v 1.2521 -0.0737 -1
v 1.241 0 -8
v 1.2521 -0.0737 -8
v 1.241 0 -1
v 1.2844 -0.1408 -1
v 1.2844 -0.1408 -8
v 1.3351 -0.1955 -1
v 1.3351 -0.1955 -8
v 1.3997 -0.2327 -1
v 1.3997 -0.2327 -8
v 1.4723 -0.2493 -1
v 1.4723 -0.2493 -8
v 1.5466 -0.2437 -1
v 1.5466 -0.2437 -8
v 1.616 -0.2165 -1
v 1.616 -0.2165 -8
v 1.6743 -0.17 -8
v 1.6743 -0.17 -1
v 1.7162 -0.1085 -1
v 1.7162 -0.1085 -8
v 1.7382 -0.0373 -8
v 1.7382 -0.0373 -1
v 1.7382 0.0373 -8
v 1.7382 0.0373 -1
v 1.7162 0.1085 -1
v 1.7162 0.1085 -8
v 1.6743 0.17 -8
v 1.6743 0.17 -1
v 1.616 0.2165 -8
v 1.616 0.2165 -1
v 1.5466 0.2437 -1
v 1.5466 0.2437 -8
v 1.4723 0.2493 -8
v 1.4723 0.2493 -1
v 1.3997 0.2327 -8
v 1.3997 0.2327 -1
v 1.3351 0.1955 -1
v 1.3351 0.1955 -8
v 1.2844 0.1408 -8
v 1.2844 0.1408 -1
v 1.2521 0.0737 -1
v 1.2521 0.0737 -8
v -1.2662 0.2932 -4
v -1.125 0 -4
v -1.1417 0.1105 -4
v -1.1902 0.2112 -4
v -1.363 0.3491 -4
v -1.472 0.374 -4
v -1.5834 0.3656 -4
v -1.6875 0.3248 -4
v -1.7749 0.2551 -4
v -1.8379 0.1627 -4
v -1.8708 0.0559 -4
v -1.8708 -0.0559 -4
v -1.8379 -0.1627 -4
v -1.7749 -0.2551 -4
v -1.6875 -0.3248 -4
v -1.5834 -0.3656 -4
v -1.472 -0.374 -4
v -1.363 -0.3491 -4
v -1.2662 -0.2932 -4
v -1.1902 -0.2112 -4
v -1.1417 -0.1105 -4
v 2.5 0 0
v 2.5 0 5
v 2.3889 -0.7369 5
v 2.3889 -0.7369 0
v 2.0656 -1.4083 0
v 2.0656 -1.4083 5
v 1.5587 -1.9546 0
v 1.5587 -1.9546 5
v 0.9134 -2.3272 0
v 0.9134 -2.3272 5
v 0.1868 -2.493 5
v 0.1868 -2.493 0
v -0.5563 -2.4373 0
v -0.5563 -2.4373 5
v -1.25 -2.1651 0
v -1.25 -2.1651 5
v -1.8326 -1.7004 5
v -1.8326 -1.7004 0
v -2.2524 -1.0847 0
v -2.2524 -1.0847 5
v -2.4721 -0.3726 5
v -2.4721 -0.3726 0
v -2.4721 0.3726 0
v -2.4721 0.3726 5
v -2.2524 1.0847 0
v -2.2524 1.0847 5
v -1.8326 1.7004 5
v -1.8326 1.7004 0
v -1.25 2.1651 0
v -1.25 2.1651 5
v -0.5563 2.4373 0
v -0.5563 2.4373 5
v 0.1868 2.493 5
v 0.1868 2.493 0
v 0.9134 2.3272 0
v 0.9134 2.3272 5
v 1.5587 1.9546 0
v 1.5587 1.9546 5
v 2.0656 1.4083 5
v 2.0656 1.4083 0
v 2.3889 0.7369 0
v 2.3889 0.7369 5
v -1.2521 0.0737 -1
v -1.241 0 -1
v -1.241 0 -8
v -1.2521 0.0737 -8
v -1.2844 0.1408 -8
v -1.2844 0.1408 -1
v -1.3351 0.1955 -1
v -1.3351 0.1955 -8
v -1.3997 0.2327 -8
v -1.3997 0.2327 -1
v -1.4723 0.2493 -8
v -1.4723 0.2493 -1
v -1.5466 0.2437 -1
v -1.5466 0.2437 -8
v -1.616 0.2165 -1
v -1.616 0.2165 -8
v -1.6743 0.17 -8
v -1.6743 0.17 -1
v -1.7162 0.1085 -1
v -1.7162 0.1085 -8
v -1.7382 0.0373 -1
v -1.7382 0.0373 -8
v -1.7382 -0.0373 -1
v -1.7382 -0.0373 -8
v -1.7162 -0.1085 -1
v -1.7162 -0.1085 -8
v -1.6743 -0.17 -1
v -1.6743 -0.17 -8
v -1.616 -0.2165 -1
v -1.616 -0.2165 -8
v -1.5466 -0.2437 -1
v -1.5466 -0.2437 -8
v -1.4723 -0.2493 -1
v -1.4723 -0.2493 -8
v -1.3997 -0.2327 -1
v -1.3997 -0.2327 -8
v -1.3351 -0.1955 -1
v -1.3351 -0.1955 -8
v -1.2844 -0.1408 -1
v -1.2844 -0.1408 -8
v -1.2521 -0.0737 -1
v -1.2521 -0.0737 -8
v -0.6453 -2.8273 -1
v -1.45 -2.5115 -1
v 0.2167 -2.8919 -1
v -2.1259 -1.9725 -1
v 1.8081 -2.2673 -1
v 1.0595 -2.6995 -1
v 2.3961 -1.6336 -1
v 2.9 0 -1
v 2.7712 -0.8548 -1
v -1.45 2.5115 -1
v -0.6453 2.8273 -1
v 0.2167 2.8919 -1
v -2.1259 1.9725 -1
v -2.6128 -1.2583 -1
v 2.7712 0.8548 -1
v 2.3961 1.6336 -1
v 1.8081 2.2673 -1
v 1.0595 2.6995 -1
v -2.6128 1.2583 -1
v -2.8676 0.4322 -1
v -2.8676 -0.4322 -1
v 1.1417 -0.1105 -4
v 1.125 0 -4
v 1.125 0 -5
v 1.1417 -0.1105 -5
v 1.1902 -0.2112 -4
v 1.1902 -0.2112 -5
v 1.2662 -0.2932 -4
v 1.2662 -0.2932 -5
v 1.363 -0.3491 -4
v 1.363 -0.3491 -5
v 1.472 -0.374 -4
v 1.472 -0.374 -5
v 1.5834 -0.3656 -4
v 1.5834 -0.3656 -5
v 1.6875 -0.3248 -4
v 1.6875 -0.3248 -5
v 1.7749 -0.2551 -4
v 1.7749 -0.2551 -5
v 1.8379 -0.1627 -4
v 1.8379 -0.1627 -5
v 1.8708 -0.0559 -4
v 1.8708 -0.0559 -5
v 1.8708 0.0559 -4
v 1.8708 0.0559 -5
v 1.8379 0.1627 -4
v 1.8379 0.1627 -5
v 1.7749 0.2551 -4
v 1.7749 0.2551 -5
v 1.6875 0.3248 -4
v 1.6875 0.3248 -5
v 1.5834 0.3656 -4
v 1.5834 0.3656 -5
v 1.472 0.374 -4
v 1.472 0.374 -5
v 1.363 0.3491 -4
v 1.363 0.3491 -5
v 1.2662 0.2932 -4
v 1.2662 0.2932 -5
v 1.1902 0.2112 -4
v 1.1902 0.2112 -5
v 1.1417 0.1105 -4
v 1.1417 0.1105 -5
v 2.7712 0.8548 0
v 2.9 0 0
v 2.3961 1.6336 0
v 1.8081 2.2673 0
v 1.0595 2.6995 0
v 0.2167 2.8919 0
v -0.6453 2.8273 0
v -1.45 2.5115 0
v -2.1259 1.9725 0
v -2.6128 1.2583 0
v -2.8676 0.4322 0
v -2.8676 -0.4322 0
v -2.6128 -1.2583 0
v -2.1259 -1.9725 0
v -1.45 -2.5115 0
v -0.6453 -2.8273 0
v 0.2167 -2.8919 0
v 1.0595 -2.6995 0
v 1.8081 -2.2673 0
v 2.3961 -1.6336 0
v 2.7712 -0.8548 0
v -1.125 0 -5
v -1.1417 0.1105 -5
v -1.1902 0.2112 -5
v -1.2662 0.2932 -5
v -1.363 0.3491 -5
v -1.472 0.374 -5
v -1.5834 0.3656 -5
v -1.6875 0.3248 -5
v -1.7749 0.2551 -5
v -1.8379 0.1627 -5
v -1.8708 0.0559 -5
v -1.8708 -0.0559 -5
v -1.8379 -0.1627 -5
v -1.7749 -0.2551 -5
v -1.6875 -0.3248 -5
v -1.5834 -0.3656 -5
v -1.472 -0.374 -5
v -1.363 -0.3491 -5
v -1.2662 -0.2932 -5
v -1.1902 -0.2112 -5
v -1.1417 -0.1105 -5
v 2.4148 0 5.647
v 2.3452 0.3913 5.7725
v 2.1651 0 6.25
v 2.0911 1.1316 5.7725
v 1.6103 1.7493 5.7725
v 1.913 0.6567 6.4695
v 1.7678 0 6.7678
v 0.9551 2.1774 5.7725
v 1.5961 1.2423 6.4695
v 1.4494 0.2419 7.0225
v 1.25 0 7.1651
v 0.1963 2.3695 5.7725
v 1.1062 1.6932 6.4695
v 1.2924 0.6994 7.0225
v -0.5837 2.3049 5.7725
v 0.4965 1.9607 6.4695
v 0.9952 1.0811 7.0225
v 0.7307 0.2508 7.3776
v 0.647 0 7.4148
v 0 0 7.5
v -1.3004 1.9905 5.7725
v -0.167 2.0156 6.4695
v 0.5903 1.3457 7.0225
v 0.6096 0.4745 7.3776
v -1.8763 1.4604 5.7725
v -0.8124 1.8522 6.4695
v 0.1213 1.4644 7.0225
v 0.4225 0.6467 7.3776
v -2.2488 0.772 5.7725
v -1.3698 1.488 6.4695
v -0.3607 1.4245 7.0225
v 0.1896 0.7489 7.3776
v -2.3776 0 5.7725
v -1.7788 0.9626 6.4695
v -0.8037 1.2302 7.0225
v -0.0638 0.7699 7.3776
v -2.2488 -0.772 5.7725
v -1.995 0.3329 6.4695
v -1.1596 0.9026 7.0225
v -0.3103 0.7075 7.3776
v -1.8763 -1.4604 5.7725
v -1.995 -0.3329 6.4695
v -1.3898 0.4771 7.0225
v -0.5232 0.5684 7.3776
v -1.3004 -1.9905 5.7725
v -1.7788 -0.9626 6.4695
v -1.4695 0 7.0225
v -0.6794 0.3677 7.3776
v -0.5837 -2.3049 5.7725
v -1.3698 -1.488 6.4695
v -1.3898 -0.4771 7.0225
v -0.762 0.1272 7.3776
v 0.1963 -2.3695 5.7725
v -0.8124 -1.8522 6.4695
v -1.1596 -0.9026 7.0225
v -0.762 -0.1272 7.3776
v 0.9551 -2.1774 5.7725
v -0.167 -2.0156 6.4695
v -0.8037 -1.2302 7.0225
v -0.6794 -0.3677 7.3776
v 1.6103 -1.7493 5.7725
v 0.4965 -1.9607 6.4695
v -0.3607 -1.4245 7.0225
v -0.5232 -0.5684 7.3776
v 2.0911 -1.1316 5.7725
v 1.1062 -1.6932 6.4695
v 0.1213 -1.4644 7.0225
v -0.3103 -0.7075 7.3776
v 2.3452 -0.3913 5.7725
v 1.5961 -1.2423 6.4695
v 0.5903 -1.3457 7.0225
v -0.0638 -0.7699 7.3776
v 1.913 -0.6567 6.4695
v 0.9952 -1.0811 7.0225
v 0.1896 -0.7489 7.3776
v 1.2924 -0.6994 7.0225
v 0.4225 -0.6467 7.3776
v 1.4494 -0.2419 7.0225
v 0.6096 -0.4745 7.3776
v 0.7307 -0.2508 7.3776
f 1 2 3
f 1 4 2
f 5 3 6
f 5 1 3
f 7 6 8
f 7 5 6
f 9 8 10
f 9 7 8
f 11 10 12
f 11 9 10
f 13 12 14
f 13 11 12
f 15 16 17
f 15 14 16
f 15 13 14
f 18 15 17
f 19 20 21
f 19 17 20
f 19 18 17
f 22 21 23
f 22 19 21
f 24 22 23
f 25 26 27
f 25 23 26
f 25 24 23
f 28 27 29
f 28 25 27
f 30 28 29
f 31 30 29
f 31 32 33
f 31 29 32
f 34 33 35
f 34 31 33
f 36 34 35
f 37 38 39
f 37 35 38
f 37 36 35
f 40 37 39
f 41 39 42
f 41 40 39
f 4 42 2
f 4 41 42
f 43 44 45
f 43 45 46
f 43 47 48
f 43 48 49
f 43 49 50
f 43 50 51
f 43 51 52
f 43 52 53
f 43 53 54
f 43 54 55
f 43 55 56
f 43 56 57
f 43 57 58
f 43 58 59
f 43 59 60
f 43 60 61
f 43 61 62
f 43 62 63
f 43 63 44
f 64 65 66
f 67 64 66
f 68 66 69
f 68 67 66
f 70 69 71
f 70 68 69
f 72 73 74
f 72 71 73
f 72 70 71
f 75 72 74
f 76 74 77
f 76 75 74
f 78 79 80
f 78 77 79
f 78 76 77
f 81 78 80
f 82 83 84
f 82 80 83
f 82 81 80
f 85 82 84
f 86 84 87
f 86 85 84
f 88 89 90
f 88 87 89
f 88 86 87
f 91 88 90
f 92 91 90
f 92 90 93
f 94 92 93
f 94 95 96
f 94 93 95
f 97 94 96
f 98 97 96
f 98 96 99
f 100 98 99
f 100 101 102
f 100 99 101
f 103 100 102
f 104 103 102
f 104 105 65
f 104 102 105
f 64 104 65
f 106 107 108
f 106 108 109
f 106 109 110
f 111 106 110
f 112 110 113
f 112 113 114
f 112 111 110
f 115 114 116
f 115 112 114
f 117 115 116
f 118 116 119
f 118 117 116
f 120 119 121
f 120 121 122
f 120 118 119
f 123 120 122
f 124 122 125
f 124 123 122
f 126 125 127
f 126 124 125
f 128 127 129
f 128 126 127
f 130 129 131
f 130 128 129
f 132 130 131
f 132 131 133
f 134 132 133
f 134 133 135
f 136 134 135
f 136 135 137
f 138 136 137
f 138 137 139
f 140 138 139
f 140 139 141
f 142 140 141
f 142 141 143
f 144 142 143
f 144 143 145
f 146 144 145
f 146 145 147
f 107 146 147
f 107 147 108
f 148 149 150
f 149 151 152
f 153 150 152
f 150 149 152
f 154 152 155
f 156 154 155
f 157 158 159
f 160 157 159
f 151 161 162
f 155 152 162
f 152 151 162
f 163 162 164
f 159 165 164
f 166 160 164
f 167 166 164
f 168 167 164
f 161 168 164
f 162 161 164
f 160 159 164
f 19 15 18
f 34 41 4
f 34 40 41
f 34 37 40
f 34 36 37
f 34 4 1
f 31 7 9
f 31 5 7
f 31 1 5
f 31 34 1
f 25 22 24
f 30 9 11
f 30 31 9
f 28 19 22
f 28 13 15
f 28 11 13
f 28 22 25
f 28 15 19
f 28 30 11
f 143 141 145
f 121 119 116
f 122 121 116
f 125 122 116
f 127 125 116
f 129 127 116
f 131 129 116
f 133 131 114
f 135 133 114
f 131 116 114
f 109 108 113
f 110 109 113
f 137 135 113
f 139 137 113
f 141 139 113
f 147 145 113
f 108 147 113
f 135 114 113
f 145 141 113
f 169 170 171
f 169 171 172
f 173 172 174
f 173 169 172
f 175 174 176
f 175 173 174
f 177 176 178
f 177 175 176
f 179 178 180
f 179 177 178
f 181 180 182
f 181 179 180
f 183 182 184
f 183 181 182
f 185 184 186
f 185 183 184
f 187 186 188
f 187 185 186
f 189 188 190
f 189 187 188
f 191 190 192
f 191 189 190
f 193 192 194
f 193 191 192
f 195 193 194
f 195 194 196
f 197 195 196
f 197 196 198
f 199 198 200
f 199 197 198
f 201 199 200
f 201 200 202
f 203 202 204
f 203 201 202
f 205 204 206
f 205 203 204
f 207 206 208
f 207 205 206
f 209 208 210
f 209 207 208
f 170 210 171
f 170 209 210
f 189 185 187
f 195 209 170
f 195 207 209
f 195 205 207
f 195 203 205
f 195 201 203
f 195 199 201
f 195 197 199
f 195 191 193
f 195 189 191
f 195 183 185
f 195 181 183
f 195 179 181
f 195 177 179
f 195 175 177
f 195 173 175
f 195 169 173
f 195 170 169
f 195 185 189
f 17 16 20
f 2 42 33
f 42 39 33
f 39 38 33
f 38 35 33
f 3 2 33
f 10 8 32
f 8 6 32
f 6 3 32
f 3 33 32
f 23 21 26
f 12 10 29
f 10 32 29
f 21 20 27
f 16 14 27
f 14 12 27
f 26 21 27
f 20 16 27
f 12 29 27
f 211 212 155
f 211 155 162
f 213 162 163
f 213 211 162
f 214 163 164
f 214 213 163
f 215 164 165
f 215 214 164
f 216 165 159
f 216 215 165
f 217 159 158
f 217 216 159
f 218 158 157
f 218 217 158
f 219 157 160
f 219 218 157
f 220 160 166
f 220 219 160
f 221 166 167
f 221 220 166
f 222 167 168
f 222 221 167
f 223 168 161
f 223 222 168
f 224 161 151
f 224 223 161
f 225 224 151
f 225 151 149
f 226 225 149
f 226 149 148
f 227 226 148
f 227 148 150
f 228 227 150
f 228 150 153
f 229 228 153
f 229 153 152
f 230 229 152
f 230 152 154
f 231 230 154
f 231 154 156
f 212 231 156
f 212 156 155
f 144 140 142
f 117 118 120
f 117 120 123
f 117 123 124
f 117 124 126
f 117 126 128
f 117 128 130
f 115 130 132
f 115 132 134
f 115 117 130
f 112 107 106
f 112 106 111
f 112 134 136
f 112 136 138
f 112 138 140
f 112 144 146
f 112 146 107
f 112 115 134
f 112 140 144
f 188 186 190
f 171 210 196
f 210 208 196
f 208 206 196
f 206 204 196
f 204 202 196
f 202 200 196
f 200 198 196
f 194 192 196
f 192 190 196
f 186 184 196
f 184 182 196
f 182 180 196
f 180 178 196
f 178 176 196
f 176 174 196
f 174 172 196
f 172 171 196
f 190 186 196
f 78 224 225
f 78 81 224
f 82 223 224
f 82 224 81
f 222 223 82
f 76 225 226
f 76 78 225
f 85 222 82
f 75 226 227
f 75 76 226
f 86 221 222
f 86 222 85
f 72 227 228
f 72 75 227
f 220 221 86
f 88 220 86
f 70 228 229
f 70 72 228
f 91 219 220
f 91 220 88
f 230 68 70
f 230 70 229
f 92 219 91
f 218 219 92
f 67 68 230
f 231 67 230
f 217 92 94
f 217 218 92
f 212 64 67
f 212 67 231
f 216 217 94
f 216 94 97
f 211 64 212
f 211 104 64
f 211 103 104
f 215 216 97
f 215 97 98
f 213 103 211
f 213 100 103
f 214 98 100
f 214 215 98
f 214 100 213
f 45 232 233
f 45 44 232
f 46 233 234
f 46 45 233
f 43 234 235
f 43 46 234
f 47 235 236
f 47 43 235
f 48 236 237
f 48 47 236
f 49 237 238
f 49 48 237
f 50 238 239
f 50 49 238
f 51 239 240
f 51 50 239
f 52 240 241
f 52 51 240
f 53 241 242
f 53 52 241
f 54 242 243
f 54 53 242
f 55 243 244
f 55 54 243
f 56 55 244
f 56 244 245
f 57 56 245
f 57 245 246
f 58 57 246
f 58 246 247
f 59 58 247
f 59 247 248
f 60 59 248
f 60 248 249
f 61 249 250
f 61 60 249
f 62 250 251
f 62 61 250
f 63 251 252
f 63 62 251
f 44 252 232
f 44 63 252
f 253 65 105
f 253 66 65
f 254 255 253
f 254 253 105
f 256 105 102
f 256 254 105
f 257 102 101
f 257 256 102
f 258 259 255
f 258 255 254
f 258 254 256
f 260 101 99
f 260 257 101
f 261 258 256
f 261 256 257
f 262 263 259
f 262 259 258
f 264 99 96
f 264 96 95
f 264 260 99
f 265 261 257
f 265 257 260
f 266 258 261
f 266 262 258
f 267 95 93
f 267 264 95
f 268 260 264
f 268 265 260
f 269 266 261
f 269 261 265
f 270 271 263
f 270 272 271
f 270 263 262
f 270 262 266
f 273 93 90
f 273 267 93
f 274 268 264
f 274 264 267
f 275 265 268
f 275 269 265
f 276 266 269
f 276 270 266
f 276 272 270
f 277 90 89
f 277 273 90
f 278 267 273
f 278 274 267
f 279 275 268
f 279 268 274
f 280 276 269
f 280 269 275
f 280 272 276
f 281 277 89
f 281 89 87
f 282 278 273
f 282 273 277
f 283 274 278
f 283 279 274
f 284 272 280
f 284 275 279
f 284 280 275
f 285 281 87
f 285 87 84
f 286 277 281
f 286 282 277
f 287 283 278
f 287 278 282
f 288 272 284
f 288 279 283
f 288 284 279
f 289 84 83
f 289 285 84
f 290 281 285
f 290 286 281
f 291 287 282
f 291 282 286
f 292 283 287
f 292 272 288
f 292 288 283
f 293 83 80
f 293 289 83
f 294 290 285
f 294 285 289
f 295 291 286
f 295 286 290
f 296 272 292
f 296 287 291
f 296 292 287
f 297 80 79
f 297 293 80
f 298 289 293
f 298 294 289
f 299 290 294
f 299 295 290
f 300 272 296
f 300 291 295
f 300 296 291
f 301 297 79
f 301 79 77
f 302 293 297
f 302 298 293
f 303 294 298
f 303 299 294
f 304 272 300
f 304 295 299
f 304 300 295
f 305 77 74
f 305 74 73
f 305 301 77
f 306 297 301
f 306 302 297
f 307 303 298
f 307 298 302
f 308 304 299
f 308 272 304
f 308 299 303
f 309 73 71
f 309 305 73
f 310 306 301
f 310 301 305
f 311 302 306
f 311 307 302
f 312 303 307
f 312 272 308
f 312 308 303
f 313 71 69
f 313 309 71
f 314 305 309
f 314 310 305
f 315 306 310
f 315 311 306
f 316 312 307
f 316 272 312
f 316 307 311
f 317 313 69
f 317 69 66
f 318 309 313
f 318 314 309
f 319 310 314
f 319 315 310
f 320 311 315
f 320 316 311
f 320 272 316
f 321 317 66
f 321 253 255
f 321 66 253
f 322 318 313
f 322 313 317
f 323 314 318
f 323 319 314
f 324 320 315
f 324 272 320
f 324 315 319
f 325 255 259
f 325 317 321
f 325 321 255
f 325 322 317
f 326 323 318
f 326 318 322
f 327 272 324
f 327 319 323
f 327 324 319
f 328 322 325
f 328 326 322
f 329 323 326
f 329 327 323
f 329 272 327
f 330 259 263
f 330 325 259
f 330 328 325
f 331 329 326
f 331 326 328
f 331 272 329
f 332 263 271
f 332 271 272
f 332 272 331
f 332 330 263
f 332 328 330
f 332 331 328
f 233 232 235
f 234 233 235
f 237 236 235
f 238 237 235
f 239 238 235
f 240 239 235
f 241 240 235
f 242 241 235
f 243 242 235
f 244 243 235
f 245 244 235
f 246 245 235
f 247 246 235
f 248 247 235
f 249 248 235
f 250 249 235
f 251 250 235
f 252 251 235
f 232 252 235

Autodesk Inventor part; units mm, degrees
ref_plane "YZ Plane" through (0, 0, 0) normal (1, 0, 0) x (0, 1, 0)
ref_plane "XZ Plane" through (0, 0, 0) normal (0, 1, 0) x (-1, 0, 0)
ref_plane "XY Plane" through (0, 0, 0) normal (0, 0, 1) x (1, 0, 0)
sketch "Skizze1" plane through (0, 0, 0) normal (0, 0, 1) x (1, 0, 0)
  circle A0 centre (0, 0) radius 2.5
  dimension "d0" = 5
extrude "Extrusion1" add sketch "Skizze1" along normal blind 7.5
fillet "Rundung1" radius 2.5 1 edges at (-2.5, 0, 7.5)
sketch "Skizze2" plane through (0, 0, 0) normal (0, 0, 1) x (1, 0, 0)
  circle A0 centre (0, 0) radius 2.9
  dimension "d4" = 5.8
extrude "Extrusion2" add sketch "Skizze2" against normal blind 1
sketch "Skizze Helper" plane through (0, 0, 0) normal (0, 0, 1) x (1, 0, 0)
  circle A0 centre (0, 0) radius 1.5 construction
  dimension "d12" = 3
sketch "Skizze5" plane through (0, 0, 0) normal (0, 0, 1) x (1, 0, 0)
  circle A0 centre (-1.491, 0) radius 0.25
  point P0 (0, 0)
  dimension "d13" = 0.5
extrude "Extrusion Bein" add sketch "Skizze5" against normal blind 7 separate body
move or copy body "Körper verschieben Bein" bodies to move or copy 2 copy no translate (0, 0, -1)
sketch "Skizze7" plane through (0, 0, 0) normal (0, 0, 1) x (1, 0, 0)
  circle A0 centre (-1.5, 0) radius 0.375
  point P0 (0, 0)
  dimension "d23" = 0.75
extrude "Extrusion Lötpunkt" add sketch "Skizze7" against normal blind 1 separate body
move or copy body "Körper verschieben Lötpunkt" bodies to move or copy 3 copy no translate (0, 0, -4)
sketch "Skizze Helper2" plane through (0, 0, 0) normal (0, 1, 0) x (-1, 0, 0)
  point P0 (0, 0)
mirror "Spiegeln1" about plane through (0, 0, 0) normal (1, 0, 0) bodies 2
mirror "Spiegeln2" about plane through (0, 0, 0) normal (1, 0, 0) bodies 3
properties part number "LED"
